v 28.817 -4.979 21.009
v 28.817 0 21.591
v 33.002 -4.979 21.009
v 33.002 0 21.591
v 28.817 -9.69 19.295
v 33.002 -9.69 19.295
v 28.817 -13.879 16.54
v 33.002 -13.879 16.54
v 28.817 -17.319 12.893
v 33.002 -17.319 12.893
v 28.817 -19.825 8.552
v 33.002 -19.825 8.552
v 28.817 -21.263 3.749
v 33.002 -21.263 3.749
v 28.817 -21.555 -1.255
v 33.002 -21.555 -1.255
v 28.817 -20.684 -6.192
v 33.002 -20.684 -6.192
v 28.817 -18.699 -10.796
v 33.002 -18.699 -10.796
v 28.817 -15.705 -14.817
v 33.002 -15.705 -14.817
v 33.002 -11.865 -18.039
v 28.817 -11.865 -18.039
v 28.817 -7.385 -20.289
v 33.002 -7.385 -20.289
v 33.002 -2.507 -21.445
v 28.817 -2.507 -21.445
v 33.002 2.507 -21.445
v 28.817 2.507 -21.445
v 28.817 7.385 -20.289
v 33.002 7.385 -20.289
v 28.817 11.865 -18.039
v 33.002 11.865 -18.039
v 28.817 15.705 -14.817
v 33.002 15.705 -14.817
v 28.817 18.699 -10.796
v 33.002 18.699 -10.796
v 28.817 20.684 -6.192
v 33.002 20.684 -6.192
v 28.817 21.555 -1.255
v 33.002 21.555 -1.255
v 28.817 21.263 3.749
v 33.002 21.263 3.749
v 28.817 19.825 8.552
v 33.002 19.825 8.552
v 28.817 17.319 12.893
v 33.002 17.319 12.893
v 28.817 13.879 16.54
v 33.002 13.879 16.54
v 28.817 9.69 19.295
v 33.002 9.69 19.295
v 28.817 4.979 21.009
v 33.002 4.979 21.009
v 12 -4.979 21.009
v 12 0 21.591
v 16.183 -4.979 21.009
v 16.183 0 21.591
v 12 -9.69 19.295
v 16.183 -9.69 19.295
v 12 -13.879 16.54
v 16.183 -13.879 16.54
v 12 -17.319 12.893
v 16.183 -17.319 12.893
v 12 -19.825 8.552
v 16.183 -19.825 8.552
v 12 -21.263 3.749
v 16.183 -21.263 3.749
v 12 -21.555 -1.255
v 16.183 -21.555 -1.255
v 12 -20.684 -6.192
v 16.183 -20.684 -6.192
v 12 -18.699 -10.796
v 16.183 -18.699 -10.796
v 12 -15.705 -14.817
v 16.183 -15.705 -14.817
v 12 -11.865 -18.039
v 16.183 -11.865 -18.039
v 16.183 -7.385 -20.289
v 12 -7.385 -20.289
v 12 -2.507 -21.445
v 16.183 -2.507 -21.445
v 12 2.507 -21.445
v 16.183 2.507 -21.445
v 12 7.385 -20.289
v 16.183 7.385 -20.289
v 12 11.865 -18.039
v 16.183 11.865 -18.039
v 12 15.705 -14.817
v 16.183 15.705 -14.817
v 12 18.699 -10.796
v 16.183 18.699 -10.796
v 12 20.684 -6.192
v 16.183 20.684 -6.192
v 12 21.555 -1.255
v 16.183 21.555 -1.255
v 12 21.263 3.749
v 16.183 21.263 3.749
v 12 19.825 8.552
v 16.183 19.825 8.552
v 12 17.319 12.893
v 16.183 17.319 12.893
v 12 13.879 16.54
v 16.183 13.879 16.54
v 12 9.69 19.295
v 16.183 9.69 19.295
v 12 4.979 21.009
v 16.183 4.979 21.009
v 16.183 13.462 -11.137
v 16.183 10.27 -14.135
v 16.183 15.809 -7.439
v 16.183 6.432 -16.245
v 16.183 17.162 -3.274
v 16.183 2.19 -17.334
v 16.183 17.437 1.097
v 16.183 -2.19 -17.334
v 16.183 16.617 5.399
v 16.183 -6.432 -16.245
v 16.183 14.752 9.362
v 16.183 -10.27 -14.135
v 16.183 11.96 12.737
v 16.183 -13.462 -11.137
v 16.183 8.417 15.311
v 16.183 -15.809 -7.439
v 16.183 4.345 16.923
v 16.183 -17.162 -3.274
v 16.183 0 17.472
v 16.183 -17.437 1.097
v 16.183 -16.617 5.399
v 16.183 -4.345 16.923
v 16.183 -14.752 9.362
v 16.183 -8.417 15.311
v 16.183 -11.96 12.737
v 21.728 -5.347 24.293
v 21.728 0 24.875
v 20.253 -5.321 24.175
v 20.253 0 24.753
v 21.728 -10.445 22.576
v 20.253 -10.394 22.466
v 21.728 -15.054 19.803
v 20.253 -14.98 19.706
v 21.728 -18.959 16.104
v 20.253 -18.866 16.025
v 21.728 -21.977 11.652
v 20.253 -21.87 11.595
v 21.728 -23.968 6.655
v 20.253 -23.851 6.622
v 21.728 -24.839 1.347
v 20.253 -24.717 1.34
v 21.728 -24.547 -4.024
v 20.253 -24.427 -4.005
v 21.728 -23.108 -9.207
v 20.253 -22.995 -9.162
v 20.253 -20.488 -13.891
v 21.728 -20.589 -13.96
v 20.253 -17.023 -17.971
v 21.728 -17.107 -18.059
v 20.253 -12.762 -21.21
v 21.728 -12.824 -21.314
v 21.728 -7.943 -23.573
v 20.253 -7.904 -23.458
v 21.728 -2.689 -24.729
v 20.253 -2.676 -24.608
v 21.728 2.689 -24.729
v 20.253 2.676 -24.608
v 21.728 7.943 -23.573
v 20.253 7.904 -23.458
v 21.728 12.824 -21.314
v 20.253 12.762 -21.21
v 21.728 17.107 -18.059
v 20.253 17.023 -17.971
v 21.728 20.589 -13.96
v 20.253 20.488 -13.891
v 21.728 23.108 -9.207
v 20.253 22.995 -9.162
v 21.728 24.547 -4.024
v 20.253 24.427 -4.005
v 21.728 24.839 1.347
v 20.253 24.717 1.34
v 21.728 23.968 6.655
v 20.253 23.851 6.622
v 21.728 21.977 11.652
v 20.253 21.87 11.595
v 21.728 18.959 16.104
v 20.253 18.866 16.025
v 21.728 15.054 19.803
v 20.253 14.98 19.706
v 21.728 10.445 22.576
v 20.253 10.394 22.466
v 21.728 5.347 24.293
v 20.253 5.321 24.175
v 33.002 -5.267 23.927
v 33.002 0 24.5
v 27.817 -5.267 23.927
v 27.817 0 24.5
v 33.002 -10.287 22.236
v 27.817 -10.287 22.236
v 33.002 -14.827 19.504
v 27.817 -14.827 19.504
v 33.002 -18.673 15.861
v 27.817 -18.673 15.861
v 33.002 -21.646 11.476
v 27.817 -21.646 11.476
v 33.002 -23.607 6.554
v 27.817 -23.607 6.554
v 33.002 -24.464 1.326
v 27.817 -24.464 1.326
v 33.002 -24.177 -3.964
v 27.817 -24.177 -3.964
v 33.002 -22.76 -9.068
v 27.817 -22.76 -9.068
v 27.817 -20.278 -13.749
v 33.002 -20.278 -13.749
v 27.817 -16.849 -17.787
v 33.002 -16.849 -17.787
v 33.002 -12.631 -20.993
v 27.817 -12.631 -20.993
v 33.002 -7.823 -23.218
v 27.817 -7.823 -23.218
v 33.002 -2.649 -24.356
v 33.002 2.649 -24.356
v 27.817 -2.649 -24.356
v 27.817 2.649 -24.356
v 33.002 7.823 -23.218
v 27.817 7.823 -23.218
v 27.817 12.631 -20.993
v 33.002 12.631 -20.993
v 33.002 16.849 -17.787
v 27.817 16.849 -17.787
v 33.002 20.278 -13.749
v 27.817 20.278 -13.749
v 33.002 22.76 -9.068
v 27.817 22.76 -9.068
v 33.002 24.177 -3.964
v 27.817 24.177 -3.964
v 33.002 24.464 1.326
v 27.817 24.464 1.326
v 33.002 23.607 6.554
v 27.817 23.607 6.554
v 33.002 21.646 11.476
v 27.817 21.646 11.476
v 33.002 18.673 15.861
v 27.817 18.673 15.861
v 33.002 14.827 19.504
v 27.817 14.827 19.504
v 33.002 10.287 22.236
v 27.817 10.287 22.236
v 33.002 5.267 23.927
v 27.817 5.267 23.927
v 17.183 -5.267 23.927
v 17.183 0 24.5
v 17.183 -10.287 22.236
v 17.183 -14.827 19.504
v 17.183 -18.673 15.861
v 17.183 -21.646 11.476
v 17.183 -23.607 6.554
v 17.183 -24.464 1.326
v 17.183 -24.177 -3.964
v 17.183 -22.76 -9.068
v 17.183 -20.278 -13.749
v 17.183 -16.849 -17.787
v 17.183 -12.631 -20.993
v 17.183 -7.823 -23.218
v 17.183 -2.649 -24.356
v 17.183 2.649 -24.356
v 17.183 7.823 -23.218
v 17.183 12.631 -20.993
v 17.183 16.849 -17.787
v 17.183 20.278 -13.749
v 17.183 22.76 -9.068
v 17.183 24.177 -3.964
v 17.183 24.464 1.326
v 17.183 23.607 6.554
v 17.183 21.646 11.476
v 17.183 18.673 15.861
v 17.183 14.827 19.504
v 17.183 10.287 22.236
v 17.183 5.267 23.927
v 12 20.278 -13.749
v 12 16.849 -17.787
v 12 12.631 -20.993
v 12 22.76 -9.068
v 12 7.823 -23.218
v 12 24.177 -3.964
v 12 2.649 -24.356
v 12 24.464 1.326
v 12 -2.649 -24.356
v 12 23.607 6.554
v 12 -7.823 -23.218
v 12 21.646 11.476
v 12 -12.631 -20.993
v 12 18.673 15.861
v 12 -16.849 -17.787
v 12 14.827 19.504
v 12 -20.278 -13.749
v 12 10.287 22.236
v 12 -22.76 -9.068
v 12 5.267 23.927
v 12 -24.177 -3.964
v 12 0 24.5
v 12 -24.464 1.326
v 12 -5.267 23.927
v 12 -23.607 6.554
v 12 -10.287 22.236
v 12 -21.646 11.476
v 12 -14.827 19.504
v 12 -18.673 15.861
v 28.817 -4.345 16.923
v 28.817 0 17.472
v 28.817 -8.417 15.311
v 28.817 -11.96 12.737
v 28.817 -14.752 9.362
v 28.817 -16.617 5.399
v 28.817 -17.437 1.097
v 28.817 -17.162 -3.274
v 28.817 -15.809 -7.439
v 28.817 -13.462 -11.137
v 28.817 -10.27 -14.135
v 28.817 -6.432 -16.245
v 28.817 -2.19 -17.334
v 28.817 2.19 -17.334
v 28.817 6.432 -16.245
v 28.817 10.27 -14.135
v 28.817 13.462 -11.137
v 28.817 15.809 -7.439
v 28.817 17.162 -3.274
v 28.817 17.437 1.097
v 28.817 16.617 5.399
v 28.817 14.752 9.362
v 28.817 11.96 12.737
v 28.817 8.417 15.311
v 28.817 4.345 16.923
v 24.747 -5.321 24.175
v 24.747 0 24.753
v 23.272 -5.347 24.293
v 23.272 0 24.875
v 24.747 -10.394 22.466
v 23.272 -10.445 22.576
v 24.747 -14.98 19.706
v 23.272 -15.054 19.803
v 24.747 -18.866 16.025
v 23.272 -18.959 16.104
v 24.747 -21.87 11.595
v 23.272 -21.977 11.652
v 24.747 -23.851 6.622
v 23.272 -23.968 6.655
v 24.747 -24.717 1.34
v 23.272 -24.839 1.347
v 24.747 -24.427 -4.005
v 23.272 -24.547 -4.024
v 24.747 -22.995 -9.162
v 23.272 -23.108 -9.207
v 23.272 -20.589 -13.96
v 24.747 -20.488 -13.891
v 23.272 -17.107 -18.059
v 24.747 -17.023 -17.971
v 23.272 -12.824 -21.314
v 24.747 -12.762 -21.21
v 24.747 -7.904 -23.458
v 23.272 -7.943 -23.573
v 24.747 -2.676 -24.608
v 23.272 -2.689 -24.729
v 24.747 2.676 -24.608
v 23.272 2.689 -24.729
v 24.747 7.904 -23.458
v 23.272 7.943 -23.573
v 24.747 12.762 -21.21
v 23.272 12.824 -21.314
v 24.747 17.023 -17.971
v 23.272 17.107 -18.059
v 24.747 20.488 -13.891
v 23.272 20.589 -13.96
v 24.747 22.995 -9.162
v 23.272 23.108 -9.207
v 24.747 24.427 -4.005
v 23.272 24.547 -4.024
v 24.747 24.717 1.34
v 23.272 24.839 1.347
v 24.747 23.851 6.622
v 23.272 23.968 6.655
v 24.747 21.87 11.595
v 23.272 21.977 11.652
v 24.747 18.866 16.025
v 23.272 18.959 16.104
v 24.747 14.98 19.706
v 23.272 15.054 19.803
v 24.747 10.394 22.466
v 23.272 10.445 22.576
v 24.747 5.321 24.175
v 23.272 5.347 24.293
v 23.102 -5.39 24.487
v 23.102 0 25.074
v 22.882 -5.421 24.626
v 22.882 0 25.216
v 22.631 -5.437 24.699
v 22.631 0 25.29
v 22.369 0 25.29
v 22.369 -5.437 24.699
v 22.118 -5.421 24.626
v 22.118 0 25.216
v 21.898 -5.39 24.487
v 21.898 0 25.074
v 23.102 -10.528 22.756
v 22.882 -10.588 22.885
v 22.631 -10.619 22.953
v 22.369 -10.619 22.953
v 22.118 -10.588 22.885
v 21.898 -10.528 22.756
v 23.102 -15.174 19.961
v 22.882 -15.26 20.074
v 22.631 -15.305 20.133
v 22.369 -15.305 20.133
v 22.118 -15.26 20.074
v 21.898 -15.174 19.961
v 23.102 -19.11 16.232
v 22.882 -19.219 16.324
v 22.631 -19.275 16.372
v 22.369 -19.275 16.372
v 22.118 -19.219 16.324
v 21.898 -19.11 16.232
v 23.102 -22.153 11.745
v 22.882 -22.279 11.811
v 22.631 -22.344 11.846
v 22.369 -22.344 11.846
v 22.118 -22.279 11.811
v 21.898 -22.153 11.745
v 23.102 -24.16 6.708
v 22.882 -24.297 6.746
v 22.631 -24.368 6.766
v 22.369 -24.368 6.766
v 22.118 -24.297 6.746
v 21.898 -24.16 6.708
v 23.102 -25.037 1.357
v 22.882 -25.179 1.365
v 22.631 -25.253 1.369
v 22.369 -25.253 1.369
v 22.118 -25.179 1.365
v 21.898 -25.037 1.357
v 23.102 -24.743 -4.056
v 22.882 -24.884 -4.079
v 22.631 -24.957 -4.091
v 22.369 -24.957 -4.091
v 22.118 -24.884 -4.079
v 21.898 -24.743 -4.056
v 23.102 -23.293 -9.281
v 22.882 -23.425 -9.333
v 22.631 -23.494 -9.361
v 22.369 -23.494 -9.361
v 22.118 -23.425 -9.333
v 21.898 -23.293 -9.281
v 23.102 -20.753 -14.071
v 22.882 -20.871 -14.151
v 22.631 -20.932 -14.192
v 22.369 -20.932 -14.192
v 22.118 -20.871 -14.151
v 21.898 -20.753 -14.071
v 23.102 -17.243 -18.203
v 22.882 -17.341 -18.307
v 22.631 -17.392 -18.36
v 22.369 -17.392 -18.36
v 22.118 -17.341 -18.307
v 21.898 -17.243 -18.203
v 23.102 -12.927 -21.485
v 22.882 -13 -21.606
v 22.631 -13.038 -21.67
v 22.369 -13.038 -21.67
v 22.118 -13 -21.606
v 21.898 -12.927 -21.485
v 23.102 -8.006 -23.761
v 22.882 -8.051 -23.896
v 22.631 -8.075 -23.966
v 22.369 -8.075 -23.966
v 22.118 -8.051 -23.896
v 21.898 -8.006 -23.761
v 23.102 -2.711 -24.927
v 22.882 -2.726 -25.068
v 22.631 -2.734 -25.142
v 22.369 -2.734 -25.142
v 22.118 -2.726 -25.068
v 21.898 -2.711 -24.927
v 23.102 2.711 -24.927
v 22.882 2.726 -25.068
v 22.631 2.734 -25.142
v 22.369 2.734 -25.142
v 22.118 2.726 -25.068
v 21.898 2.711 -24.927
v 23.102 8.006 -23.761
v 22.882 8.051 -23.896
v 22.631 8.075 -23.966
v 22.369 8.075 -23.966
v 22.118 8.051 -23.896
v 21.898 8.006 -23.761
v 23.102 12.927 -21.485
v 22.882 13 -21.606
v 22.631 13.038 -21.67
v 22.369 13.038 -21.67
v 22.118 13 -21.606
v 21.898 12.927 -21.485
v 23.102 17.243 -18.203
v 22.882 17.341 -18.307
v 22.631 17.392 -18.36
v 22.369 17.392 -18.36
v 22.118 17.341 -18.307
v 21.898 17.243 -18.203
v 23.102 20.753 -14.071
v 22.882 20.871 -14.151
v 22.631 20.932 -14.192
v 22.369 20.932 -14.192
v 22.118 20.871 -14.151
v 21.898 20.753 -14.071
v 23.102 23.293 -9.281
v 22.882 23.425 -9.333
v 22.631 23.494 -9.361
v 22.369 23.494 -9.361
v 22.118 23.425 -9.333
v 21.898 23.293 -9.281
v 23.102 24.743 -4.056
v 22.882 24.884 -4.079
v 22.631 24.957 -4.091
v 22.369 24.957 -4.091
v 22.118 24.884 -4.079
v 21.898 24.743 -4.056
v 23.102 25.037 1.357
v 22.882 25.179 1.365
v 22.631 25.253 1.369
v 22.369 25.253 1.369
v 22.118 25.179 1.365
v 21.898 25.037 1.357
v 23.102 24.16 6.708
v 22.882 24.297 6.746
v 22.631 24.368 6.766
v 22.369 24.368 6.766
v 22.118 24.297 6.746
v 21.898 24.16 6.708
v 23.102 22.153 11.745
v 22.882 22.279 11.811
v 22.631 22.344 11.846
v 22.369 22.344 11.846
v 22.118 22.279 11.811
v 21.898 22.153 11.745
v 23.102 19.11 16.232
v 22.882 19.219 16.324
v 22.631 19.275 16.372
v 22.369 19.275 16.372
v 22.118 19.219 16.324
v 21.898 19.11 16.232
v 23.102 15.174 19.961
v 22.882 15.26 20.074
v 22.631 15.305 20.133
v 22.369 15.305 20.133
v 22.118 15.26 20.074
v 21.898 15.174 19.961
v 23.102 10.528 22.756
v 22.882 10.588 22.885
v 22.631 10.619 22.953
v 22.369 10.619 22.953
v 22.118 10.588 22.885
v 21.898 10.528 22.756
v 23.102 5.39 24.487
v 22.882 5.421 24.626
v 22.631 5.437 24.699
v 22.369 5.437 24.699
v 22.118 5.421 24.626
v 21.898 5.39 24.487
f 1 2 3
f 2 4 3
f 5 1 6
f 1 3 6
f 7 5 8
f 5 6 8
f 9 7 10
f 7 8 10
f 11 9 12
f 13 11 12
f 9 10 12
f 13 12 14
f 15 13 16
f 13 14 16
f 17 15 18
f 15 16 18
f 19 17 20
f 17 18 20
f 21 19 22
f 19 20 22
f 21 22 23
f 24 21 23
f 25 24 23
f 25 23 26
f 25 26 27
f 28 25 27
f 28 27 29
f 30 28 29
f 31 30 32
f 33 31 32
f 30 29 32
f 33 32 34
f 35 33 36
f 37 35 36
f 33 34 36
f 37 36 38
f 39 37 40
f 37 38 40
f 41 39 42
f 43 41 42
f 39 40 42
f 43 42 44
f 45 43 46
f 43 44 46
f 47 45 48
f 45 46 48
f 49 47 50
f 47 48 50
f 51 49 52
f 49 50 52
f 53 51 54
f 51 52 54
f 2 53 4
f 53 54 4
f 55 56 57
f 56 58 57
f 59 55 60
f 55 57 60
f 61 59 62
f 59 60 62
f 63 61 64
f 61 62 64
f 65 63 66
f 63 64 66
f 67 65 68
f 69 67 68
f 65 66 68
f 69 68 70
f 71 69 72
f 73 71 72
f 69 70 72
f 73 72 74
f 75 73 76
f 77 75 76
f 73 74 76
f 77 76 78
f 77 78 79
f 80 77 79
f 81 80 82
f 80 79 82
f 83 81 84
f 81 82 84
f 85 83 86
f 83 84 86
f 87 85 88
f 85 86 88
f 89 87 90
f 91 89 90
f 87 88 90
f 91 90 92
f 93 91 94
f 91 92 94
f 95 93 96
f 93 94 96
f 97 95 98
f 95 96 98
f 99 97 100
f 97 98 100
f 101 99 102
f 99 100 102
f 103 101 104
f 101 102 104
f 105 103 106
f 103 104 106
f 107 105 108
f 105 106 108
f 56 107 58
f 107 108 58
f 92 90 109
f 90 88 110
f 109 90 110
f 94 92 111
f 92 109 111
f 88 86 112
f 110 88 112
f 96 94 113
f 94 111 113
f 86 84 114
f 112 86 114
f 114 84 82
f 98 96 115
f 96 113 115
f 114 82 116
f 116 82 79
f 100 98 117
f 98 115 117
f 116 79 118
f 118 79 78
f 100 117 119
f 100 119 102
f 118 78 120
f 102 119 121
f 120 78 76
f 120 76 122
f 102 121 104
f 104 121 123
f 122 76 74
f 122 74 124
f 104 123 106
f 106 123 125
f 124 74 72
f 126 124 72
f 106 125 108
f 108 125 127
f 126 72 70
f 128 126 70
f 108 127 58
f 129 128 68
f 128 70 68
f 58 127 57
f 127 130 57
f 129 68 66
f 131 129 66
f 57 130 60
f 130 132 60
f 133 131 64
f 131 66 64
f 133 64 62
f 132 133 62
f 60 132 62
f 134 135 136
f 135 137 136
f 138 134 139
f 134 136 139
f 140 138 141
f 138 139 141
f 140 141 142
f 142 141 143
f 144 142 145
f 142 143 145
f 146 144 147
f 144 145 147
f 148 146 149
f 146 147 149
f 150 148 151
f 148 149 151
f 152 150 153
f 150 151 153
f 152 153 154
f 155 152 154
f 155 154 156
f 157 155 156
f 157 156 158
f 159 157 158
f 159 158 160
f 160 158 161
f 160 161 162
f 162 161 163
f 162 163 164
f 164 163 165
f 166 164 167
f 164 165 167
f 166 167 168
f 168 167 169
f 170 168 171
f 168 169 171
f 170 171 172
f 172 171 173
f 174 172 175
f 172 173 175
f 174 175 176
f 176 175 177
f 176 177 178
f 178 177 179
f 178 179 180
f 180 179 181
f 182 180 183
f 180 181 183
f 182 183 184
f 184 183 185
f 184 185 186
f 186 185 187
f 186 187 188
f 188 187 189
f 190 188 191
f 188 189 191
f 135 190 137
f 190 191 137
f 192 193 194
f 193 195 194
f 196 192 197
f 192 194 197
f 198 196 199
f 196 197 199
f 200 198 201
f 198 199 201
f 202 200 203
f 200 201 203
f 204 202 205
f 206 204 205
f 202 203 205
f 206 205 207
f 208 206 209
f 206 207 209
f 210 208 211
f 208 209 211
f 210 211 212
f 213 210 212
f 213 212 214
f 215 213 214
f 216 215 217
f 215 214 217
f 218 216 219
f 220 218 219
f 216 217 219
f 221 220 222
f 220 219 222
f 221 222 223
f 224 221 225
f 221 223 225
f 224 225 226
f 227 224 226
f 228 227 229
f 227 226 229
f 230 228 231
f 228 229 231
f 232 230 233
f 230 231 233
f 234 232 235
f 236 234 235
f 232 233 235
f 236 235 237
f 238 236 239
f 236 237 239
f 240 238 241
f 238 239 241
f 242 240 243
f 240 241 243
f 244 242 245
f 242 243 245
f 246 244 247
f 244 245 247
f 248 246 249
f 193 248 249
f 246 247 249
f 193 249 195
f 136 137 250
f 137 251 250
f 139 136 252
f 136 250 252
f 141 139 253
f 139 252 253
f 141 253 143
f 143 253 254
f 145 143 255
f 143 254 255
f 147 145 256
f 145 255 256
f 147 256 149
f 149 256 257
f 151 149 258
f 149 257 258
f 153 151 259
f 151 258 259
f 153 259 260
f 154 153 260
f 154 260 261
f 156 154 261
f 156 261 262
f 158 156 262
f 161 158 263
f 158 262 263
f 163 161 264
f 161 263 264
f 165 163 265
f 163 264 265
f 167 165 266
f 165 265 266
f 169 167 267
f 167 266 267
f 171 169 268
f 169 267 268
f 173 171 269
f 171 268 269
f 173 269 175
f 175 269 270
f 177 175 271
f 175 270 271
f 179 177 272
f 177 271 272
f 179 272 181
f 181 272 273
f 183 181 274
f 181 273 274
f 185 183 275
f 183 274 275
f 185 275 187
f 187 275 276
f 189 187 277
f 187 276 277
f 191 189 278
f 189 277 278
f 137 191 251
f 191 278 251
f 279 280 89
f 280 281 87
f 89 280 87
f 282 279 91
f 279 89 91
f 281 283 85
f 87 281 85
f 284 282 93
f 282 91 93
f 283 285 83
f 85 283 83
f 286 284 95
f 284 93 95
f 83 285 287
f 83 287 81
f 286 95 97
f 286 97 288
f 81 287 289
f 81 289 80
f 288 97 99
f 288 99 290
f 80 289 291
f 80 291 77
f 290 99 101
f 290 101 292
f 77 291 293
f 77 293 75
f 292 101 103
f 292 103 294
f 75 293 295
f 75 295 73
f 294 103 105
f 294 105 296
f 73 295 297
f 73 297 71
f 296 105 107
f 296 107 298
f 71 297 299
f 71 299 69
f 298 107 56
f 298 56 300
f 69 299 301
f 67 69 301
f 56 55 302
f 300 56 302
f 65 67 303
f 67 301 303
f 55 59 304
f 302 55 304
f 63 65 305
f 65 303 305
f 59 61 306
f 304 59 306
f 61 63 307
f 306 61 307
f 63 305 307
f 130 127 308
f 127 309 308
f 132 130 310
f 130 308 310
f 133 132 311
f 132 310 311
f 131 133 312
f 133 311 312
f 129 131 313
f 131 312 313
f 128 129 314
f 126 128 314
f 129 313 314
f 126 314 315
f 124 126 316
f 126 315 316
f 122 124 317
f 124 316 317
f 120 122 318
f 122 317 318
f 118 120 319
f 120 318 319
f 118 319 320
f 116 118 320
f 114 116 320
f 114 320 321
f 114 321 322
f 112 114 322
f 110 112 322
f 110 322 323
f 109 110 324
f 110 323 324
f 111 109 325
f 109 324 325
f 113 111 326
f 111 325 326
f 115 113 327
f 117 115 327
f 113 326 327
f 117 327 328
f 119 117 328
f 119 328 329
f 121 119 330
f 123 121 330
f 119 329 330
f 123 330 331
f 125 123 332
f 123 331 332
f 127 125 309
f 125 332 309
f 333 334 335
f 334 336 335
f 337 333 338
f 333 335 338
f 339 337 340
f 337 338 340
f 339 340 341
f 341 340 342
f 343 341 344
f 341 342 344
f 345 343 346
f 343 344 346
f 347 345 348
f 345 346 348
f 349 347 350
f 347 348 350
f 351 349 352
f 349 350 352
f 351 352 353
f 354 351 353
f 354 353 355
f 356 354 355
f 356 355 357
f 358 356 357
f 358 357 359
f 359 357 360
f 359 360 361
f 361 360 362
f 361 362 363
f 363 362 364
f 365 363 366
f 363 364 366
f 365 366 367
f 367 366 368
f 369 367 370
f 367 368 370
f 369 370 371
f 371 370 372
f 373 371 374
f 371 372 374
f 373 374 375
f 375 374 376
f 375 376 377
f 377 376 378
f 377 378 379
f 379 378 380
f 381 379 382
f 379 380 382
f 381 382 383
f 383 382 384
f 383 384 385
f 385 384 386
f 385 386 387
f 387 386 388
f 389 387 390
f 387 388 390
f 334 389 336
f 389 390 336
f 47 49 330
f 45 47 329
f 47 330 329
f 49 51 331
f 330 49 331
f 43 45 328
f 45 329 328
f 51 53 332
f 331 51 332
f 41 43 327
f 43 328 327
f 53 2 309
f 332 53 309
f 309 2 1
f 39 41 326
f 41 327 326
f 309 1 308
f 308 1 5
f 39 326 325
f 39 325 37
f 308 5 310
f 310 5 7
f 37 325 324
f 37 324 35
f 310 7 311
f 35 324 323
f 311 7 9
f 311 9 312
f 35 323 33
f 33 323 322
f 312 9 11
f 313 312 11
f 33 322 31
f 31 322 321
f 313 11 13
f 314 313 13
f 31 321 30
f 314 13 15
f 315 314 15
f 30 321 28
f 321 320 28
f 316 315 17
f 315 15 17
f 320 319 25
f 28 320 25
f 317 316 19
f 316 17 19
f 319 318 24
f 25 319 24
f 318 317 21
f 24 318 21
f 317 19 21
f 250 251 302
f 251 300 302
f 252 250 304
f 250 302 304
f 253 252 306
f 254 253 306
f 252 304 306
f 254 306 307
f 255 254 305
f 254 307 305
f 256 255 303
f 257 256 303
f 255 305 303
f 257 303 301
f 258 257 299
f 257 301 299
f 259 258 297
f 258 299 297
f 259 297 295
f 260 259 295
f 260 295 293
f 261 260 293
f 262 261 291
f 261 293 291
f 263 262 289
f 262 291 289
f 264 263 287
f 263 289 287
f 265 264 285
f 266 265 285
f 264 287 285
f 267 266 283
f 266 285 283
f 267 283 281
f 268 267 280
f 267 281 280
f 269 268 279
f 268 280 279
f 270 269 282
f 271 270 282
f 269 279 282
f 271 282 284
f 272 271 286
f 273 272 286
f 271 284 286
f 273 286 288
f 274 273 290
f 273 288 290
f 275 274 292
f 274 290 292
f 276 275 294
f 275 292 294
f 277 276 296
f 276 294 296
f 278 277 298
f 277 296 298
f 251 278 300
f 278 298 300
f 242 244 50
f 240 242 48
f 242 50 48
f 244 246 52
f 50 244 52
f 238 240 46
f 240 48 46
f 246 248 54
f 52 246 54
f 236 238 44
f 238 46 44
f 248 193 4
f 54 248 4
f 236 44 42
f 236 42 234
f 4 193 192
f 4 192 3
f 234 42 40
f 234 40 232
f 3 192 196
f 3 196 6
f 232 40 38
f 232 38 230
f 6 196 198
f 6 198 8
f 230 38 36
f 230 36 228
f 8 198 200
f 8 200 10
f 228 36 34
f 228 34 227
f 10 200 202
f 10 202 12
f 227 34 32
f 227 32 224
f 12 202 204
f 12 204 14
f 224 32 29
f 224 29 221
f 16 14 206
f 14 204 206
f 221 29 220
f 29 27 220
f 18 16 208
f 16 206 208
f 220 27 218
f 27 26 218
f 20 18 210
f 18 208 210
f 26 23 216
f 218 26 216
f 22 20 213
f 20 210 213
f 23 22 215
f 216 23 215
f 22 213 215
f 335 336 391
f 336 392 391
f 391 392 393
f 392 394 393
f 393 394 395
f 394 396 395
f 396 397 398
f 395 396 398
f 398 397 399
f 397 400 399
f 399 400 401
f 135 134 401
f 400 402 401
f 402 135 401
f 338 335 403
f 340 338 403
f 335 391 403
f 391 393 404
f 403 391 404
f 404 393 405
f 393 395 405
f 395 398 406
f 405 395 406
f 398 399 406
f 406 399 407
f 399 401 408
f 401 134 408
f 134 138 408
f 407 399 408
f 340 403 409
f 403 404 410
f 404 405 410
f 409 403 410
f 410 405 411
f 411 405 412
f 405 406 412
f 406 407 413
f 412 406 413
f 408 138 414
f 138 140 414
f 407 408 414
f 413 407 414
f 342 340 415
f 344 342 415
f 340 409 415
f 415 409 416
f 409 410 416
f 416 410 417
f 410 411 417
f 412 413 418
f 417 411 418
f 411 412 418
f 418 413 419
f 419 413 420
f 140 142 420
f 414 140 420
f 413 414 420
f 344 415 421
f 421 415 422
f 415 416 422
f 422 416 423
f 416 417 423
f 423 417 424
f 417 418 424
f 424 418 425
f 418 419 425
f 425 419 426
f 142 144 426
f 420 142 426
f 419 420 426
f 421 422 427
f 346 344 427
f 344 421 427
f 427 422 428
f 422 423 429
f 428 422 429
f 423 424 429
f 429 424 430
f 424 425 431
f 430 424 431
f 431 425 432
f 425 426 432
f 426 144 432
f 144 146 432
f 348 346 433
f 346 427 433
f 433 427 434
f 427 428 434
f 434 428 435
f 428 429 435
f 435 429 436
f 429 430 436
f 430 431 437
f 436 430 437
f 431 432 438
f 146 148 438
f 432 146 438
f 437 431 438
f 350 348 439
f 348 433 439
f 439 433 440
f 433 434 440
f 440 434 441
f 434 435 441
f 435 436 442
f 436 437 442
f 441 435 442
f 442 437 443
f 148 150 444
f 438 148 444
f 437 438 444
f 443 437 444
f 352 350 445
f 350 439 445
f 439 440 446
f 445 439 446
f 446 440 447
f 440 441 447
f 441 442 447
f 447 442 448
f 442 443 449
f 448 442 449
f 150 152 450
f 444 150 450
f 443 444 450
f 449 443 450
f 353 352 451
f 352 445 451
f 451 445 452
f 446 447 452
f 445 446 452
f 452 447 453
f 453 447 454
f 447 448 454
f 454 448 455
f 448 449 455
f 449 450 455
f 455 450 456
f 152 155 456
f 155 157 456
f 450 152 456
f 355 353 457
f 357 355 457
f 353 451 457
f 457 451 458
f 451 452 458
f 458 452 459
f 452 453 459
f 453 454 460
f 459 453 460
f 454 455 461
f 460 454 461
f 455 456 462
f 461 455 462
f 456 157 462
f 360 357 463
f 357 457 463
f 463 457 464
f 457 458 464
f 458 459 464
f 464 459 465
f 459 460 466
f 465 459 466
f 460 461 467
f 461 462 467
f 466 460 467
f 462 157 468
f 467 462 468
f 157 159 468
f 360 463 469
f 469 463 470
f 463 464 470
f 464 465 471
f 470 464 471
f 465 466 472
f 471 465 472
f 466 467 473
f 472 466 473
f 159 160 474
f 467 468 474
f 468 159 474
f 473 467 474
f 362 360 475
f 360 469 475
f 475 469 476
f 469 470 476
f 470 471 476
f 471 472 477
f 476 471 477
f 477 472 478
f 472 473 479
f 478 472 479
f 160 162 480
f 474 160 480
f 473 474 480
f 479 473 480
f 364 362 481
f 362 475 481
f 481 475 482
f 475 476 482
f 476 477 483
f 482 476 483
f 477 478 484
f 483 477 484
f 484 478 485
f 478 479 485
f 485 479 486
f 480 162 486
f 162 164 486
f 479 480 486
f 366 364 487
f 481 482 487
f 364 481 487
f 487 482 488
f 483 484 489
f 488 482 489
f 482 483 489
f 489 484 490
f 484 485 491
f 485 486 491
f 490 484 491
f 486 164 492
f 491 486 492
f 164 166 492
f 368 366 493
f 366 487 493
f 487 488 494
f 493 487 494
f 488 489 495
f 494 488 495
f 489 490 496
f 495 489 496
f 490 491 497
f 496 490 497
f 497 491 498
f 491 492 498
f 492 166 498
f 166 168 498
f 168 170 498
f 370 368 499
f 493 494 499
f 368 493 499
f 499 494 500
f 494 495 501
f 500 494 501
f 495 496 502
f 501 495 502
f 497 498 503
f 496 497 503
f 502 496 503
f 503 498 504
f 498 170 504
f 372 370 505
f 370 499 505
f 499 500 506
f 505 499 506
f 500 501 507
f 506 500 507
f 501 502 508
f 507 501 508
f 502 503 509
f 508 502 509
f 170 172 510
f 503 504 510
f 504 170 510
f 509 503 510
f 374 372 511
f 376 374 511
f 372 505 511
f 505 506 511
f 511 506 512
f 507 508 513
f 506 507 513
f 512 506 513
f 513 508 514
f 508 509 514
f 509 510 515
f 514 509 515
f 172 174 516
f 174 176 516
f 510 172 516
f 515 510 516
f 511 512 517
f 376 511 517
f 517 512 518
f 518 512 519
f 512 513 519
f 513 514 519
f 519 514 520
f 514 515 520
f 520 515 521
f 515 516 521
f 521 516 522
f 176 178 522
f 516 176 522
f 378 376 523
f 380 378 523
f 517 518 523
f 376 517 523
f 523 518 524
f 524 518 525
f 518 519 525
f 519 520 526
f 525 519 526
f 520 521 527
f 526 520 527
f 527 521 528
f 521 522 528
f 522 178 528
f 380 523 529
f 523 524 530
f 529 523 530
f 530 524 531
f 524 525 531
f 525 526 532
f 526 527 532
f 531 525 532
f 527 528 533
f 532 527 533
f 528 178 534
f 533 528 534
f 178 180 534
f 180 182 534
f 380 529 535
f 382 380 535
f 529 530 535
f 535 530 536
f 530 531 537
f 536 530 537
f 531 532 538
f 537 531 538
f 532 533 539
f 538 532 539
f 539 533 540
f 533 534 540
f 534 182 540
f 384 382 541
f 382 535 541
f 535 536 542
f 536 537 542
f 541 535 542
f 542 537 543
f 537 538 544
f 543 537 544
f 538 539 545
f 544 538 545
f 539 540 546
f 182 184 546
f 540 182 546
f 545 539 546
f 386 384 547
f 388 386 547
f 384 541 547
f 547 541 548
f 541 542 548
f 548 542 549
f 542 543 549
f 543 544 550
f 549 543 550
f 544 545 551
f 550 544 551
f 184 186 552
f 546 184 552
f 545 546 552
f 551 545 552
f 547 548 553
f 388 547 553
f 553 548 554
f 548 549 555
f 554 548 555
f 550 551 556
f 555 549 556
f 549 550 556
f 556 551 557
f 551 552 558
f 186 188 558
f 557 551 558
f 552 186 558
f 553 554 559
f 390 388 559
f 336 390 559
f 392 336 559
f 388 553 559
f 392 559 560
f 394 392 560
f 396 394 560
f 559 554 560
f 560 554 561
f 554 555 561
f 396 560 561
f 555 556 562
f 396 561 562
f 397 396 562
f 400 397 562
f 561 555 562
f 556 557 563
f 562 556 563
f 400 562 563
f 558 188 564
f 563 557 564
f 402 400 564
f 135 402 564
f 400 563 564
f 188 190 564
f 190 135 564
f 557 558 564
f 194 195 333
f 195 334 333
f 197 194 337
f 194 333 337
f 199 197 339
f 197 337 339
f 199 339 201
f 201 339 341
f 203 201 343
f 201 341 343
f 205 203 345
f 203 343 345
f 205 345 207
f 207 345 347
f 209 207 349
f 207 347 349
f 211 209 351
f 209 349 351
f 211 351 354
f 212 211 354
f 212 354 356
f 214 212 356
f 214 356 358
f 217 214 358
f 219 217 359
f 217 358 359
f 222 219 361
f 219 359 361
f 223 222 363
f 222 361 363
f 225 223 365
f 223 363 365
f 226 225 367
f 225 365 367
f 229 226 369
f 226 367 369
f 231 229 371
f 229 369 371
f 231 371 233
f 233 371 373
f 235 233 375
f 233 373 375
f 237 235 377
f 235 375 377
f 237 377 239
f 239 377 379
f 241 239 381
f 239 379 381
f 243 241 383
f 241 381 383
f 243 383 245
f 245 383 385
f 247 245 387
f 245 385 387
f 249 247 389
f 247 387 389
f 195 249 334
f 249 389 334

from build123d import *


with BuildPart() as part:
    # Sketch1 → Revolve1 (revolve)
    with BuildSketch(Plane.XY, mode=Mode.PRIVATE) as revolve1_sk:
        with BuildLine():
            Line((12, 24.5), (12, 21.591227021))
            Line((12, 21.591227021), (16.182938488, 21.591227021))
            Line((16.182938488, 21.591227021), (16.182938488, 17.471972716))
            Line((16.182938488, 17.471972716), (28.817061512, 17.471972716))
            Line((28.817061512, 17.471972716), (28.817061512, 21.591227021))
            Line((28.817061512, 21.591227021), (33.001856356, 21.591227021))
            Line((33.001856356, 21.591227021), (33.001856356, 24.5))
            Line((33.001856356, 24.5), (33, 24.5))
            Line((33, 24.5), (27.817061512, 24.5))
            Line((27.817061512, 24.5), (24.746847829, 24.753346743))
            Line((24.746847829, 24.753346743), (23.272118433, 24.875037911))
            ThreePointArc((23.272118433, 24.875037911), (22.5, 25.299429712), (21.727881567, 24.875037911))
            Line((21.727881567, 24.875037911), (20.253152171, 24.753346743))
            Line((20.253152171, 24.753346743), (17.182938488, 24.5))
            Line((17.182938488, 24.5), (12, 24.5))
        make_face()
    revolve(revolve1_sk.sketch.rotate(Axis((0, 0, 0), (1, 0, 0)), 90), axis=Axis((0, 0, 0), (1, 0, 0)))


solid = part.part
